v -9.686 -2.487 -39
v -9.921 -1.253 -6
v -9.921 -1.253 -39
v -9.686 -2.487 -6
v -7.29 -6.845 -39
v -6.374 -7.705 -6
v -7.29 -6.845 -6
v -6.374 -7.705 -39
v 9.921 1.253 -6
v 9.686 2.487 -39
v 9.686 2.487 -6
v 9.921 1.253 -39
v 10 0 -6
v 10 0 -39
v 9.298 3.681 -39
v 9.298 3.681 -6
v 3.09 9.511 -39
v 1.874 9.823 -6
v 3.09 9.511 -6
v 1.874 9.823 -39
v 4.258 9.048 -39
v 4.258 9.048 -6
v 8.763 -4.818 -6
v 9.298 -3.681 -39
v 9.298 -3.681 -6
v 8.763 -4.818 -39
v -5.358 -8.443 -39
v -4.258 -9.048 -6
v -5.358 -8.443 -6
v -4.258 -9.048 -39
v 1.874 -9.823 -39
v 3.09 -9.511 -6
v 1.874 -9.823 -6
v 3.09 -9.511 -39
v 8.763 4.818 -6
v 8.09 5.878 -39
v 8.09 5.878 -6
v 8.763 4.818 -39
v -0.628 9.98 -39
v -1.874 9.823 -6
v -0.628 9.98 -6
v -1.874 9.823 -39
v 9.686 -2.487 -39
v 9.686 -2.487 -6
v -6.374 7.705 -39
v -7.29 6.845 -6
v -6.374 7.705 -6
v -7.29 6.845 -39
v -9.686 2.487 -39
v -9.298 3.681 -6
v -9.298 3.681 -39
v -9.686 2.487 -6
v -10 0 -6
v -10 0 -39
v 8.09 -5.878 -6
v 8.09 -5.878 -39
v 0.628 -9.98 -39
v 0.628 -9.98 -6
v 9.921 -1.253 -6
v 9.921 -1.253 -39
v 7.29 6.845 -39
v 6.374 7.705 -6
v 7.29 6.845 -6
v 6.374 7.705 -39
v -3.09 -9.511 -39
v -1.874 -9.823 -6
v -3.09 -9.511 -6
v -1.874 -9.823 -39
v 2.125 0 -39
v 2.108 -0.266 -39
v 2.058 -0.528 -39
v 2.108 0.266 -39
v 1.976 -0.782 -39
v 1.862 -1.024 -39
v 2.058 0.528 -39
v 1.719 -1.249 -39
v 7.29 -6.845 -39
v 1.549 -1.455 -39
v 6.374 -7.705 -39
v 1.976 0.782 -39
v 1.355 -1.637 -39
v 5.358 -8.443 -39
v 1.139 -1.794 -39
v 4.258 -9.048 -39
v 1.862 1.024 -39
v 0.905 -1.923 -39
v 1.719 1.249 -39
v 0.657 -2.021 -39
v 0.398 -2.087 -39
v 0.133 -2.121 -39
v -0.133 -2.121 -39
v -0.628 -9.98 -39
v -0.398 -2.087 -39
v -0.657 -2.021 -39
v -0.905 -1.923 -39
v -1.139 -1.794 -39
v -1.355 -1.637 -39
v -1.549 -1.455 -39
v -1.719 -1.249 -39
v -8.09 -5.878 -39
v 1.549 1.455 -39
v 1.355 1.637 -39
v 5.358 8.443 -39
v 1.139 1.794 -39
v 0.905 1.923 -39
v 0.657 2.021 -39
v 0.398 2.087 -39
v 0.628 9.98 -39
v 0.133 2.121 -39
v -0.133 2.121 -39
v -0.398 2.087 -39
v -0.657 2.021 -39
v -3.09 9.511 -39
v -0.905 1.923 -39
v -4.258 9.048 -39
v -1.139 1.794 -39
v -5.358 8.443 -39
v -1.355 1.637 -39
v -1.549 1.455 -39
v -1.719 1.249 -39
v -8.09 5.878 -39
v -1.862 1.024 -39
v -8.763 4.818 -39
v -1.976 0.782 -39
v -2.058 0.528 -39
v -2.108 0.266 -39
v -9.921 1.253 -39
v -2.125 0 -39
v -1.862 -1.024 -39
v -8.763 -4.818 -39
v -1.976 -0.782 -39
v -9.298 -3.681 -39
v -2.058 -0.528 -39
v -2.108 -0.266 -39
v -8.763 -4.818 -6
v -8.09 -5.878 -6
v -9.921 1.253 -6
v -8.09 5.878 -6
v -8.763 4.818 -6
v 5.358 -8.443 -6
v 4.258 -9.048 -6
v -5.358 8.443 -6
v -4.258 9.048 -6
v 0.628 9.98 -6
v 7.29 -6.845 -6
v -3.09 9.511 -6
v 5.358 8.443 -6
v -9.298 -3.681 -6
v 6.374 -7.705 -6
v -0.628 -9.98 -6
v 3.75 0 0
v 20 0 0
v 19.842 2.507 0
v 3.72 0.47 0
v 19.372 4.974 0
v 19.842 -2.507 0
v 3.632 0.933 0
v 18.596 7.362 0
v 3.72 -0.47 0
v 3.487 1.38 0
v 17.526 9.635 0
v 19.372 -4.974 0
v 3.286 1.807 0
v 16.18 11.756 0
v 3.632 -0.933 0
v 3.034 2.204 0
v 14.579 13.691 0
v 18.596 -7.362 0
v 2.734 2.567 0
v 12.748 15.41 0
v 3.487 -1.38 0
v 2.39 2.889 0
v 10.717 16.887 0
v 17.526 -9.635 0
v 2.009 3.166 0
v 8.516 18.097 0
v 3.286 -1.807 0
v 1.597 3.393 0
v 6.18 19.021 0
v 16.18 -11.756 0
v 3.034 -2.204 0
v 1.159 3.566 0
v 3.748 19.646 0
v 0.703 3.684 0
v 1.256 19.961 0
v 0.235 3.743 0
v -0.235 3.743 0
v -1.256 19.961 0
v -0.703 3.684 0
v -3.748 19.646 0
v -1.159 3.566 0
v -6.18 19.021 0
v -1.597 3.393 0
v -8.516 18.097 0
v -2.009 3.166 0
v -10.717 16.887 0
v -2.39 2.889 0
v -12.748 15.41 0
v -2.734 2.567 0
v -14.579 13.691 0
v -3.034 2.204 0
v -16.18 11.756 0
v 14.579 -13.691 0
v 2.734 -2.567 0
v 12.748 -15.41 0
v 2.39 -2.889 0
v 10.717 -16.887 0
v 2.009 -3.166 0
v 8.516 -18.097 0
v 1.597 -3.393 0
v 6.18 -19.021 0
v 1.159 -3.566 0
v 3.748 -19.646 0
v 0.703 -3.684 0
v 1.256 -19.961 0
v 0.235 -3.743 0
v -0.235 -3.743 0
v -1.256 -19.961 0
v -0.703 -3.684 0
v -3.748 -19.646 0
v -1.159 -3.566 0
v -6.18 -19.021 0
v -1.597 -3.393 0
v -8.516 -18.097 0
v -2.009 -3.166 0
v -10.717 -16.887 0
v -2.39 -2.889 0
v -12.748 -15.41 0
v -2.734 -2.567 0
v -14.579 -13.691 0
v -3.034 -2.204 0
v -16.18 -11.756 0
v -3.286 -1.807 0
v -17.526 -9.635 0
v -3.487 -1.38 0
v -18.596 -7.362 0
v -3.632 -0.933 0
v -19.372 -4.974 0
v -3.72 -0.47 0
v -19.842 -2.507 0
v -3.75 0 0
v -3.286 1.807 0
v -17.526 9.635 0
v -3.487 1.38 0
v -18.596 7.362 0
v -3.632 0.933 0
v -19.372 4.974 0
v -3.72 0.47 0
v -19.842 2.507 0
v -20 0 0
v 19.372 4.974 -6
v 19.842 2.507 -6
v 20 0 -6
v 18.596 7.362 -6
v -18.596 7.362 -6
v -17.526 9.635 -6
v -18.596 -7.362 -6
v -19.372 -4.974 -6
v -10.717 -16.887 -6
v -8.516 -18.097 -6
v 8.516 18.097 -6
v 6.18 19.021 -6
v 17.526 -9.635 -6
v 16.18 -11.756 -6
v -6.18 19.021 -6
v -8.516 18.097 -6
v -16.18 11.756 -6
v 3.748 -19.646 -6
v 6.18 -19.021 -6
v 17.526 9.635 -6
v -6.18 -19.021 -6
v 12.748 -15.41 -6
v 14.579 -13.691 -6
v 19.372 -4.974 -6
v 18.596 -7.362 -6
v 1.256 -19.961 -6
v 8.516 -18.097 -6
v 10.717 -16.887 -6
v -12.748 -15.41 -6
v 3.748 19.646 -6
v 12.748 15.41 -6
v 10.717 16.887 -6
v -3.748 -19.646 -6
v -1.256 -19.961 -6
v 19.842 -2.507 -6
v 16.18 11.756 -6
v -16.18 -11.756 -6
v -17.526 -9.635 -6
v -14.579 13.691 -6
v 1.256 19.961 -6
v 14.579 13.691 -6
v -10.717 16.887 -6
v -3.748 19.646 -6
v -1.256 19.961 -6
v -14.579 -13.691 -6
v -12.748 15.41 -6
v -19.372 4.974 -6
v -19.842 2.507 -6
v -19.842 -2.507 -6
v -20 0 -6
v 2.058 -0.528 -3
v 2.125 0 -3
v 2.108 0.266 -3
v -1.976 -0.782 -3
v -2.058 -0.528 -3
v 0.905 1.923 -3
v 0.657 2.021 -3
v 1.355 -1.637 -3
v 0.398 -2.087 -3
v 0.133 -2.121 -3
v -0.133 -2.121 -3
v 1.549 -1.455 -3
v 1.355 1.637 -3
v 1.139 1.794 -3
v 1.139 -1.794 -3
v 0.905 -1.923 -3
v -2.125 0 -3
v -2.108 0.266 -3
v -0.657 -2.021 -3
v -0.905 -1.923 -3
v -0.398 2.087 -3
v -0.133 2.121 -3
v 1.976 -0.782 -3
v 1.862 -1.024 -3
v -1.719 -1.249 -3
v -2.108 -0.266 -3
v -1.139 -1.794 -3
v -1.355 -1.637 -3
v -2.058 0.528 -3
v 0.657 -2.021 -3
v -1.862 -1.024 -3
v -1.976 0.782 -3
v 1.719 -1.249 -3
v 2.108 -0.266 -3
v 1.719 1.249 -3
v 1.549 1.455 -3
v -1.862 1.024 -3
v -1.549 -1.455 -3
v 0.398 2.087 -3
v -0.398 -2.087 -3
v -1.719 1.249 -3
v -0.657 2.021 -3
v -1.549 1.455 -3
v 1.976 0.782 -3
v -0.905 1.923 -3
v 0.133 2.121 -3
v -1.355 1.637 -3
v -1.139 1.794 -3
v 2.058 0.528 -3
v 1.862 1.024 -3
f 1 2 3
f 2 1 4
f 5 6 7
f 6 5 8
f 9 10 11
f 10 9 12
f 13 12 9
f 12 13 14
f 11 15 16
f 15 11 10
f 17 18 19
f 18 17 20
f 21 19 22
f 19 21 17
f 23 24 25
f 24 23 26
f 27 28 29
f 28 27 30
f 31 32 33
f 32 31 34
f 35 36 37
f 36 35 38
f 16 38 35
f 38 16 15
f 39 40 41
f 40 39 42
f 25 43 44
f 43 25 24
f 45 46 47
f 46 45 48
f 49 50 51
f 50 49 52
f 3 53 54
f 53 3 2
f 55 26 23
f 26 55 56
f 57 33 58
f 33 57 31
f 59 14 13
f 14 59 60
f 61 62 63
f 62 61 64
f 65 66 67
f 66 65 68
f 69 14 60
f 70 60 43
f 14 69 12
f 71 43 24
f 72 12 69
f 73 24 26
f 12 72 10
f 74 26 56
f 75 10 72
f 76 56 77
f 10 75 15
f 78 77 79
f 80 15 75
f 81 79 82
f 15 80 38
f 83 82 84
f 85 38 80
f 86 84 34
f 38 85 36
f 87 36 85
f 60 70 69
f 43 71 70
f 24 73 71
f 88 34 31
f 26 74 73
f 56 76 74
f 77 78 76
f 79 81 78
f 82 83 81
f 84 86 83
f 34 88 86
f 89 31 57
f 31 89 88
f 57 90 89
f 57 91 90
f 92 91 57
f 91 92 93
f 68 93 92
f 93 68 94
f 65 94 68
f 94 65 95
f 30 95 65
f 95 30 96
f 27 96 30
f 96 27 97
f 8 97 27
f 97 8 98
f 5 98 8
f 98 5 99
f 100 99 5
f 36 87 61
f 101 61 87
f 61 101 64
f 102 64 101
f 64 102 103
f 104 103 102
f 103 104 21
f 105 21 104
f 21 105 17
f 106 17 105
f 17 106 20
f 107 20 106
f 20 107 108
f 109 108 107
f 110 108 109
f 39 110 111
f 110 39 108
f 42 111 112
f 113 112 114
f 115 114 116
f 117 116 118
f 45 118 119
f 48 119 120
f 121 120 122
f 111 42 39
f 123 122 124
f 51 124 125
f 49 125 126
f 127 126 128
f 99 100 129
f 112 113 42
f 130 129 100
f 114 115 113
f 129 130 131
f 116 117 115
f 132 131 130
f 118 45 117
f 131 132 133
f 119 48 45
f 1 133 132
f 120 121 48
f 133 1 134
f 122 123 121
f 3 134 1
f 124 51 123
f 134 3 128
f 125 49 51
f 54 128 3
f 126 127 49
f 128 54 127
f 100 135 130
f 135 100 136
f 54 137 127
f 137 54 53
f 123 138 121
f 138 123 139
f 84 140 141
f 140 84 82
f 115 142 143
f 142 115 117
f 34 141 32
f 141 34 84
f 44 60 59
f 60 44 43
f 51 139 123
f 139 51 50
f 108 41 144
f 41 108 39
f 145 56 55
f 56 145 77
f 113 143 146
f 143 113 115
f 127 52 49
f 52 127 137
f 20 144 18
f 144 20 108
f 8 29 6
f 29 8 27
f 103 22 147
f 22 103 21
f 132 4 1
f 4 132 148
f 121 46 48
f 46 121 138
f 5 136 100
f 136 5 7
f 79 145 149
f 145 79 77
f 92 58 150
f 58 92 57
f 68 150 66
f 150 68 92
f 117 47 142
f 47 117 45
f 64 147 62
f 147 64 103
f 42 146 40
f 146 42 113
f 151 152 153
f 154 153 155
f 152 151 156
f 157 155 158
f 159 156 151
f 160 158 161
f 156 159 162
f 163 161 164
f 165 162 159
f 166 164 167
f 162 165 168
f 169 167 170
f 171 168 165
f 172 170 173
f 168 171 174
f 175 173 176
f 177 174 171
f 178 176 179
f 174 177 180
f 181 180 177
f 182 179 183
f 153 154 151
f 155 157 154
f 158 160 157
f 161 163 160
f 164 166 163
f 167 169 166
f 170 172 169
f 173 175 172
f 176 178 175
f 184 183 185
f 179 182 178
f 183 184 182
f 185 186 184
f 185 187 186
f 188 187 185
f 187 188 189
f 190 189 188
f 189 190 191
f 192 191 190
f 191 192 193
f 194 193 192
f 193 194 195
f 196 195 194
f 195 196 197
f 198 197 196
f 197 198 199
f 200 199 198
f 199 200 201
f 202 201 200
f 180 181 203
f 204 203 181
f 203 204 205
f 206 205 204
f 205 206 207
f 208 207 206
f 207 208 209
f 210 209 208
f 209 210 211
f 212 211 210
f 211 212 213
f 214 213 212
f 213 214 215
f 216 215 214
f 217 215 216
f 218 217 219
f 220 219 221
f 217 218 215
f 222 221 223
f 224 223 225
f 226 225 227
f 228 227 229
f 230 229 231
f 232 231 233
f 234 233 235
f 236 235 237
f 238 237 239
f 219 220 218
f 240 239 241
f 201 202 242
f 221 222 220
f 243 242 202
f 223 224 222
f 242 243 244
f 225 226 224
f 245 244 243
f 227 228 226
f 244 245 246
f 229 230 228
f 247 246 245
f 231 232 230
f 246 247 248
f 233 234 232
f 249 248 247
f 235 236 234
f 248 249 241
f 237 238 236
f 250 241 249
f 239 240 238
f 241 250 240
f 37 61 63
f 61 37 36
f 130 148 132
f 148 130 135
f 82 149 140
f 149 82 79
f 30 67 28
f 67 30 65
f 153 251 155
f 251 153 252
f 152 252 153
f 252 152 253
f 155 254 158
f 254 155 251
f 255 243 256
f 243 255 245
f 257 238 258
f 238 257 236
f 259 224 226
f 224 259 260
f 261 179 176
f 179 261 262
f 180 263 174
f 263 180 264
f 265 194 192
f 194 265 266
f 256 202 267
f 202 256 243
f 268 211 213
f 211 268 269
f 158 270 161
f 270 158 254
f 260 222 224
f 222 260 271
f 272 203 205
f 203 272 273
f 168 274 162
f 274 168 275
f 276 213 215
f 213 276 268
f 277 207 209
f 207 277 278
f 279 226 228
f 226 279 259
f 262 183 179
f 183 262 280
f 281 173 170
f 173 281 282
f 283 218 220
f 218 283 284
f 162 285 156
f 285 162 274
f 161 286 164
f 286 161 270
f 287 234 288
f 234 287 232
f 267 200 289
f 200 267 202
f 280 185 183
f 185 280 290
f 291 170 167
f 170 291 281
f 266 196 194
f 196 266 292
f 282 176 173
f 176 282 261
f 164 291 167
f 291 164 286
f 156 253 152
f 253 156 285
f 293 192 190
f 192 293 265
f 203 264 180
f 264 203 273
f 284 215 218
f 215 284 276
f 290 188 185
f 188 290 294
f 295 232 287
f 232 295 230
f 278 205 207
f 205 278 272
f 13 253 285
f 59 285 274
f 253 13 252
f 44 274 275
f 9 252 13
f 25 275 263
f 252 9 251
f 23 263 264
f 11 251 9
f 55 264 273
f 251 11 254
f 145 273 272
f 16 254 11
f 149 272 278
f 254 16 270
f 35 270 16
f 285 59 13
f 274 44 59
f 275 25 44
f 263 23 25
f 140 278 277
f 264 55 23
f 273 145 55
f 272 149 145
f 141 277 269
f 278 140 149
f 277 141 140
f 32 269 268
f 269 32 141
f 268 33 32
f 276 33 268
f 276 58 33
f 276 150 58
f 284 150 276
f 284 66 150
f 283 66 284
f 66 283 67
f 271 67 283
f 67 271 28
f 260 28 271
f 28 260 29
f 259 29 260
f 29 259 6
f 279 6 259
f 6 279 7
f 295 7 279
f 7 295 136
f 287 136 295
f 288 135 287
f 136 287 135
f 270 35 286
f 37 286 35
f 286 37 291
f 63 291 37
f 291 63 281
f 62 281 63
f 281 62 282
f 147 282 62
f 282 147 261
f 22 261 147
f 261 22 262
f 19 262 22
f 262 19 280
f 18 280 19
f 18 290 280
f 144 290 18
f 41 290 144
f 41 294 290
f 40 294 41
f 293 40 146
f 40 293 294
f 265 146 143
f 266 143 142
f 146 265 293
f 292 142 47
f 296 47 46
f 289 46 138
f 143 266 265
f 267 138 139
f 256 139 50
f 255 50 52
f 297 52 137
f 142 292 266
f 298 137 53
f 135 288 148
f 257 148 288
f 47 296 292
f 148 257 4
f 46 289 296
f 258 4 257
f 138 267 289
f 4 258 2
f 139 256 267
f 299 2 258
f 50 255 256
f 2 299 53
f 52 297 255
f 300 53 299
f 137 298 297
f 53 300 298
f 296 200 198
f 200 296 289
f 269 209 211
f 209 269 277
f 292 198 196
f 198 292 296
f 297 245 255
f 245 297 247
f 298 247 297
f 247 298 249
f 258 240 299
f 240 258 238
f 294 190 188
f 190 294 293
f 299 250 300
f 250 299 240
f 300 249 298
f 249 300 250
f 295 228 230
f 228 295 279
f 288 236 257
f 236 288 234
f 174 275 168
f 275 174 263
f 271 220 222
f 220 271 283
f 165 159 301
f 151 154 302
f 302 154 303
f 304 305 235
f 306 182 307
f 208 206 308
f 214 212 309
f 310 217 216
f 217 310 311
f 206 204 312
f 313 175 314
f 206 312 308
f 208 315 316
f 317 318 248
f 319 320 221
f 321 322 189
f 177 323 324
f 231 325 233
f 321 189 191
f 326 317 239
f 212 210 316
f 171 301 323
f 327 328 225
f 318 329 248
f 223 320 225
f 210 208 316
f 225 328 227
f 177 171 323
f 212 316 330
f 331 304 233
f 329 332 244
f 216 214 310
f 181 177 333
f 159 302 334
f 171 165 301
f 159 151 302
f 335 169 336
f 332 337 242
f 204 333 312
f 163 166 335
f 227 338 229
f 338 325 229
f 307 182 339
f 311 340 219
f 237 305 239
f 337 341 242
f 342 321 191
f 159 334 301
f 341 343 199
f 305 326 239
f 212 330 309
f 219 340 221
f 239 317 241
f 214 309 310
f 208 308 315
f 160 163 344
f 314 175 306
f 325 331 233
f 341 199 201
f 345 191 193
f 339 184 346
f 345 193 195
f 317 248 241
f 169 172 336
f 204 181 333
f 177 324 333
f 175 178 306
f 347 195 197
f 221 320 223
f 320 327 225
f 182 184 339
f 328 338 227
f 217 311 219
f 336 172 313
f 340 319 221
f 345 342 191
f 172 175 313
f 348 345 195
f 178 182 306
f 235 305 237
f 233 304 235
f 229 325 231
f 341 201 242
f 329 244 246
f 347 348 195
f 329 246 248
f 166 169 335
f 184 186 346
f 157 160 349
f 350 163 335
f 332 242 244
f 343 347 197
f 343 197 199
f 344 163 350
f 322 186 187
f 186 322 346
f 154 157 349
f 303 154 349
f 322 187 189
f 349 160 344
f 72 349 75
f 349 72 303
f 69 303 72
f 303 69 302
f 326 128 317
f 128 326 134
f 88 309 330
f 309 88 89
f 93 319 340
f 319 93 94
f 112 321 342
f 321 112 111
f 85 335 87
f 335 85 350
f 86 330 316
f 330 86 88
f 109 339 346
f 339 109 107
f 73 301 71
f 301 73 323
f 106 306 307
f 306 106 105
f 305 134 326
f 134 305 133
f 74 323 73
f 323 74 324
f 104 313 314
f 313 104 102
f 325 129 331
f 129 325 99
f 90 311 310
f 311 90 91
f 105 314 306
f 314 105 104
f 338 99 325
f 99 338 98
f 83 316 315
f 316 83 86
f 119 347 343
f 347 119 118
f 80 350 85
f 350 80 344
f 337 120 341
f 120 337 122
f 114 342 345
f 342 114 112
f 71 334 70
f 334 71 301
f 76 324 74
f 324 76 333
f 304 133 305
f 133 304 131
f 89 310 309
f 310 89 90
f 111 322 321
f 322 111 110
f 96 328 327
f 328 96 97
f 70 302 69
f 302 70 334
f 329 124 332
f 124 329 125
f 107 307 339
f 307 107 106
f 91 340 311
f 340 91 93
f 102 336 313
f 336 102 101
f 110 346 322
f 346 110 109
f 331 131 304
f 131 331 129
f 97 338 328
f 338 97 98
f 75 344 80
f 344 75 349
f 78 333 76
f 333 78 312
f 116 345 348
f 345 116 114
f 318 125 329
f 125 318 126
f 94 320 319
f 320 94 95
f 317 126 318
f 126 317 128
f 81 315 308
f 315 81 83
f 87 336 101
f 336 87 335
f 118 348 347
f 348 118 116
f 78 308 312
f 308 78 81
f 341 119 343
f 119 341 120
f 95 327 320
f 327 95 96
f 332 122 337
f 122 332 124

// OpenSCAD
$fn = 50;


difference() {
	union() {
		translate(v = [0, 0, -39.0000000000]) {
			cylinder(h = 39, r = 10.0000000000);
		}
		translate(v = [0, 0, -6.0000000000]) {
			cylinder(h = 6, r = 20.0000000000);
		}
	}
	union() {
		translate(v = [0, 0, 0]) {
			rotate(a = [0, 0, 0]) {
				difference() {
					union() {
						#translate(v = [0, 0, -39.0000000000]) {
							cylinder(h = 39, r = 2.0000000000);
						}
						#translate(v = [0, 0, -3]) {
							cylinder(h = 3, r1 = 2.1250000000, r2 = 3.7500000000);
						}
						#translate(v = [0, 0, -39.0000000000]) {
							cylinder(h = 39, r = 2.1250000000);
						}
						#translate(v = [0, 0, -39.0000000000]) {
							cylinder(h = 39, r = 2.0000000000);
						}
					}
					union();
				}
			}
		}
	}
}
